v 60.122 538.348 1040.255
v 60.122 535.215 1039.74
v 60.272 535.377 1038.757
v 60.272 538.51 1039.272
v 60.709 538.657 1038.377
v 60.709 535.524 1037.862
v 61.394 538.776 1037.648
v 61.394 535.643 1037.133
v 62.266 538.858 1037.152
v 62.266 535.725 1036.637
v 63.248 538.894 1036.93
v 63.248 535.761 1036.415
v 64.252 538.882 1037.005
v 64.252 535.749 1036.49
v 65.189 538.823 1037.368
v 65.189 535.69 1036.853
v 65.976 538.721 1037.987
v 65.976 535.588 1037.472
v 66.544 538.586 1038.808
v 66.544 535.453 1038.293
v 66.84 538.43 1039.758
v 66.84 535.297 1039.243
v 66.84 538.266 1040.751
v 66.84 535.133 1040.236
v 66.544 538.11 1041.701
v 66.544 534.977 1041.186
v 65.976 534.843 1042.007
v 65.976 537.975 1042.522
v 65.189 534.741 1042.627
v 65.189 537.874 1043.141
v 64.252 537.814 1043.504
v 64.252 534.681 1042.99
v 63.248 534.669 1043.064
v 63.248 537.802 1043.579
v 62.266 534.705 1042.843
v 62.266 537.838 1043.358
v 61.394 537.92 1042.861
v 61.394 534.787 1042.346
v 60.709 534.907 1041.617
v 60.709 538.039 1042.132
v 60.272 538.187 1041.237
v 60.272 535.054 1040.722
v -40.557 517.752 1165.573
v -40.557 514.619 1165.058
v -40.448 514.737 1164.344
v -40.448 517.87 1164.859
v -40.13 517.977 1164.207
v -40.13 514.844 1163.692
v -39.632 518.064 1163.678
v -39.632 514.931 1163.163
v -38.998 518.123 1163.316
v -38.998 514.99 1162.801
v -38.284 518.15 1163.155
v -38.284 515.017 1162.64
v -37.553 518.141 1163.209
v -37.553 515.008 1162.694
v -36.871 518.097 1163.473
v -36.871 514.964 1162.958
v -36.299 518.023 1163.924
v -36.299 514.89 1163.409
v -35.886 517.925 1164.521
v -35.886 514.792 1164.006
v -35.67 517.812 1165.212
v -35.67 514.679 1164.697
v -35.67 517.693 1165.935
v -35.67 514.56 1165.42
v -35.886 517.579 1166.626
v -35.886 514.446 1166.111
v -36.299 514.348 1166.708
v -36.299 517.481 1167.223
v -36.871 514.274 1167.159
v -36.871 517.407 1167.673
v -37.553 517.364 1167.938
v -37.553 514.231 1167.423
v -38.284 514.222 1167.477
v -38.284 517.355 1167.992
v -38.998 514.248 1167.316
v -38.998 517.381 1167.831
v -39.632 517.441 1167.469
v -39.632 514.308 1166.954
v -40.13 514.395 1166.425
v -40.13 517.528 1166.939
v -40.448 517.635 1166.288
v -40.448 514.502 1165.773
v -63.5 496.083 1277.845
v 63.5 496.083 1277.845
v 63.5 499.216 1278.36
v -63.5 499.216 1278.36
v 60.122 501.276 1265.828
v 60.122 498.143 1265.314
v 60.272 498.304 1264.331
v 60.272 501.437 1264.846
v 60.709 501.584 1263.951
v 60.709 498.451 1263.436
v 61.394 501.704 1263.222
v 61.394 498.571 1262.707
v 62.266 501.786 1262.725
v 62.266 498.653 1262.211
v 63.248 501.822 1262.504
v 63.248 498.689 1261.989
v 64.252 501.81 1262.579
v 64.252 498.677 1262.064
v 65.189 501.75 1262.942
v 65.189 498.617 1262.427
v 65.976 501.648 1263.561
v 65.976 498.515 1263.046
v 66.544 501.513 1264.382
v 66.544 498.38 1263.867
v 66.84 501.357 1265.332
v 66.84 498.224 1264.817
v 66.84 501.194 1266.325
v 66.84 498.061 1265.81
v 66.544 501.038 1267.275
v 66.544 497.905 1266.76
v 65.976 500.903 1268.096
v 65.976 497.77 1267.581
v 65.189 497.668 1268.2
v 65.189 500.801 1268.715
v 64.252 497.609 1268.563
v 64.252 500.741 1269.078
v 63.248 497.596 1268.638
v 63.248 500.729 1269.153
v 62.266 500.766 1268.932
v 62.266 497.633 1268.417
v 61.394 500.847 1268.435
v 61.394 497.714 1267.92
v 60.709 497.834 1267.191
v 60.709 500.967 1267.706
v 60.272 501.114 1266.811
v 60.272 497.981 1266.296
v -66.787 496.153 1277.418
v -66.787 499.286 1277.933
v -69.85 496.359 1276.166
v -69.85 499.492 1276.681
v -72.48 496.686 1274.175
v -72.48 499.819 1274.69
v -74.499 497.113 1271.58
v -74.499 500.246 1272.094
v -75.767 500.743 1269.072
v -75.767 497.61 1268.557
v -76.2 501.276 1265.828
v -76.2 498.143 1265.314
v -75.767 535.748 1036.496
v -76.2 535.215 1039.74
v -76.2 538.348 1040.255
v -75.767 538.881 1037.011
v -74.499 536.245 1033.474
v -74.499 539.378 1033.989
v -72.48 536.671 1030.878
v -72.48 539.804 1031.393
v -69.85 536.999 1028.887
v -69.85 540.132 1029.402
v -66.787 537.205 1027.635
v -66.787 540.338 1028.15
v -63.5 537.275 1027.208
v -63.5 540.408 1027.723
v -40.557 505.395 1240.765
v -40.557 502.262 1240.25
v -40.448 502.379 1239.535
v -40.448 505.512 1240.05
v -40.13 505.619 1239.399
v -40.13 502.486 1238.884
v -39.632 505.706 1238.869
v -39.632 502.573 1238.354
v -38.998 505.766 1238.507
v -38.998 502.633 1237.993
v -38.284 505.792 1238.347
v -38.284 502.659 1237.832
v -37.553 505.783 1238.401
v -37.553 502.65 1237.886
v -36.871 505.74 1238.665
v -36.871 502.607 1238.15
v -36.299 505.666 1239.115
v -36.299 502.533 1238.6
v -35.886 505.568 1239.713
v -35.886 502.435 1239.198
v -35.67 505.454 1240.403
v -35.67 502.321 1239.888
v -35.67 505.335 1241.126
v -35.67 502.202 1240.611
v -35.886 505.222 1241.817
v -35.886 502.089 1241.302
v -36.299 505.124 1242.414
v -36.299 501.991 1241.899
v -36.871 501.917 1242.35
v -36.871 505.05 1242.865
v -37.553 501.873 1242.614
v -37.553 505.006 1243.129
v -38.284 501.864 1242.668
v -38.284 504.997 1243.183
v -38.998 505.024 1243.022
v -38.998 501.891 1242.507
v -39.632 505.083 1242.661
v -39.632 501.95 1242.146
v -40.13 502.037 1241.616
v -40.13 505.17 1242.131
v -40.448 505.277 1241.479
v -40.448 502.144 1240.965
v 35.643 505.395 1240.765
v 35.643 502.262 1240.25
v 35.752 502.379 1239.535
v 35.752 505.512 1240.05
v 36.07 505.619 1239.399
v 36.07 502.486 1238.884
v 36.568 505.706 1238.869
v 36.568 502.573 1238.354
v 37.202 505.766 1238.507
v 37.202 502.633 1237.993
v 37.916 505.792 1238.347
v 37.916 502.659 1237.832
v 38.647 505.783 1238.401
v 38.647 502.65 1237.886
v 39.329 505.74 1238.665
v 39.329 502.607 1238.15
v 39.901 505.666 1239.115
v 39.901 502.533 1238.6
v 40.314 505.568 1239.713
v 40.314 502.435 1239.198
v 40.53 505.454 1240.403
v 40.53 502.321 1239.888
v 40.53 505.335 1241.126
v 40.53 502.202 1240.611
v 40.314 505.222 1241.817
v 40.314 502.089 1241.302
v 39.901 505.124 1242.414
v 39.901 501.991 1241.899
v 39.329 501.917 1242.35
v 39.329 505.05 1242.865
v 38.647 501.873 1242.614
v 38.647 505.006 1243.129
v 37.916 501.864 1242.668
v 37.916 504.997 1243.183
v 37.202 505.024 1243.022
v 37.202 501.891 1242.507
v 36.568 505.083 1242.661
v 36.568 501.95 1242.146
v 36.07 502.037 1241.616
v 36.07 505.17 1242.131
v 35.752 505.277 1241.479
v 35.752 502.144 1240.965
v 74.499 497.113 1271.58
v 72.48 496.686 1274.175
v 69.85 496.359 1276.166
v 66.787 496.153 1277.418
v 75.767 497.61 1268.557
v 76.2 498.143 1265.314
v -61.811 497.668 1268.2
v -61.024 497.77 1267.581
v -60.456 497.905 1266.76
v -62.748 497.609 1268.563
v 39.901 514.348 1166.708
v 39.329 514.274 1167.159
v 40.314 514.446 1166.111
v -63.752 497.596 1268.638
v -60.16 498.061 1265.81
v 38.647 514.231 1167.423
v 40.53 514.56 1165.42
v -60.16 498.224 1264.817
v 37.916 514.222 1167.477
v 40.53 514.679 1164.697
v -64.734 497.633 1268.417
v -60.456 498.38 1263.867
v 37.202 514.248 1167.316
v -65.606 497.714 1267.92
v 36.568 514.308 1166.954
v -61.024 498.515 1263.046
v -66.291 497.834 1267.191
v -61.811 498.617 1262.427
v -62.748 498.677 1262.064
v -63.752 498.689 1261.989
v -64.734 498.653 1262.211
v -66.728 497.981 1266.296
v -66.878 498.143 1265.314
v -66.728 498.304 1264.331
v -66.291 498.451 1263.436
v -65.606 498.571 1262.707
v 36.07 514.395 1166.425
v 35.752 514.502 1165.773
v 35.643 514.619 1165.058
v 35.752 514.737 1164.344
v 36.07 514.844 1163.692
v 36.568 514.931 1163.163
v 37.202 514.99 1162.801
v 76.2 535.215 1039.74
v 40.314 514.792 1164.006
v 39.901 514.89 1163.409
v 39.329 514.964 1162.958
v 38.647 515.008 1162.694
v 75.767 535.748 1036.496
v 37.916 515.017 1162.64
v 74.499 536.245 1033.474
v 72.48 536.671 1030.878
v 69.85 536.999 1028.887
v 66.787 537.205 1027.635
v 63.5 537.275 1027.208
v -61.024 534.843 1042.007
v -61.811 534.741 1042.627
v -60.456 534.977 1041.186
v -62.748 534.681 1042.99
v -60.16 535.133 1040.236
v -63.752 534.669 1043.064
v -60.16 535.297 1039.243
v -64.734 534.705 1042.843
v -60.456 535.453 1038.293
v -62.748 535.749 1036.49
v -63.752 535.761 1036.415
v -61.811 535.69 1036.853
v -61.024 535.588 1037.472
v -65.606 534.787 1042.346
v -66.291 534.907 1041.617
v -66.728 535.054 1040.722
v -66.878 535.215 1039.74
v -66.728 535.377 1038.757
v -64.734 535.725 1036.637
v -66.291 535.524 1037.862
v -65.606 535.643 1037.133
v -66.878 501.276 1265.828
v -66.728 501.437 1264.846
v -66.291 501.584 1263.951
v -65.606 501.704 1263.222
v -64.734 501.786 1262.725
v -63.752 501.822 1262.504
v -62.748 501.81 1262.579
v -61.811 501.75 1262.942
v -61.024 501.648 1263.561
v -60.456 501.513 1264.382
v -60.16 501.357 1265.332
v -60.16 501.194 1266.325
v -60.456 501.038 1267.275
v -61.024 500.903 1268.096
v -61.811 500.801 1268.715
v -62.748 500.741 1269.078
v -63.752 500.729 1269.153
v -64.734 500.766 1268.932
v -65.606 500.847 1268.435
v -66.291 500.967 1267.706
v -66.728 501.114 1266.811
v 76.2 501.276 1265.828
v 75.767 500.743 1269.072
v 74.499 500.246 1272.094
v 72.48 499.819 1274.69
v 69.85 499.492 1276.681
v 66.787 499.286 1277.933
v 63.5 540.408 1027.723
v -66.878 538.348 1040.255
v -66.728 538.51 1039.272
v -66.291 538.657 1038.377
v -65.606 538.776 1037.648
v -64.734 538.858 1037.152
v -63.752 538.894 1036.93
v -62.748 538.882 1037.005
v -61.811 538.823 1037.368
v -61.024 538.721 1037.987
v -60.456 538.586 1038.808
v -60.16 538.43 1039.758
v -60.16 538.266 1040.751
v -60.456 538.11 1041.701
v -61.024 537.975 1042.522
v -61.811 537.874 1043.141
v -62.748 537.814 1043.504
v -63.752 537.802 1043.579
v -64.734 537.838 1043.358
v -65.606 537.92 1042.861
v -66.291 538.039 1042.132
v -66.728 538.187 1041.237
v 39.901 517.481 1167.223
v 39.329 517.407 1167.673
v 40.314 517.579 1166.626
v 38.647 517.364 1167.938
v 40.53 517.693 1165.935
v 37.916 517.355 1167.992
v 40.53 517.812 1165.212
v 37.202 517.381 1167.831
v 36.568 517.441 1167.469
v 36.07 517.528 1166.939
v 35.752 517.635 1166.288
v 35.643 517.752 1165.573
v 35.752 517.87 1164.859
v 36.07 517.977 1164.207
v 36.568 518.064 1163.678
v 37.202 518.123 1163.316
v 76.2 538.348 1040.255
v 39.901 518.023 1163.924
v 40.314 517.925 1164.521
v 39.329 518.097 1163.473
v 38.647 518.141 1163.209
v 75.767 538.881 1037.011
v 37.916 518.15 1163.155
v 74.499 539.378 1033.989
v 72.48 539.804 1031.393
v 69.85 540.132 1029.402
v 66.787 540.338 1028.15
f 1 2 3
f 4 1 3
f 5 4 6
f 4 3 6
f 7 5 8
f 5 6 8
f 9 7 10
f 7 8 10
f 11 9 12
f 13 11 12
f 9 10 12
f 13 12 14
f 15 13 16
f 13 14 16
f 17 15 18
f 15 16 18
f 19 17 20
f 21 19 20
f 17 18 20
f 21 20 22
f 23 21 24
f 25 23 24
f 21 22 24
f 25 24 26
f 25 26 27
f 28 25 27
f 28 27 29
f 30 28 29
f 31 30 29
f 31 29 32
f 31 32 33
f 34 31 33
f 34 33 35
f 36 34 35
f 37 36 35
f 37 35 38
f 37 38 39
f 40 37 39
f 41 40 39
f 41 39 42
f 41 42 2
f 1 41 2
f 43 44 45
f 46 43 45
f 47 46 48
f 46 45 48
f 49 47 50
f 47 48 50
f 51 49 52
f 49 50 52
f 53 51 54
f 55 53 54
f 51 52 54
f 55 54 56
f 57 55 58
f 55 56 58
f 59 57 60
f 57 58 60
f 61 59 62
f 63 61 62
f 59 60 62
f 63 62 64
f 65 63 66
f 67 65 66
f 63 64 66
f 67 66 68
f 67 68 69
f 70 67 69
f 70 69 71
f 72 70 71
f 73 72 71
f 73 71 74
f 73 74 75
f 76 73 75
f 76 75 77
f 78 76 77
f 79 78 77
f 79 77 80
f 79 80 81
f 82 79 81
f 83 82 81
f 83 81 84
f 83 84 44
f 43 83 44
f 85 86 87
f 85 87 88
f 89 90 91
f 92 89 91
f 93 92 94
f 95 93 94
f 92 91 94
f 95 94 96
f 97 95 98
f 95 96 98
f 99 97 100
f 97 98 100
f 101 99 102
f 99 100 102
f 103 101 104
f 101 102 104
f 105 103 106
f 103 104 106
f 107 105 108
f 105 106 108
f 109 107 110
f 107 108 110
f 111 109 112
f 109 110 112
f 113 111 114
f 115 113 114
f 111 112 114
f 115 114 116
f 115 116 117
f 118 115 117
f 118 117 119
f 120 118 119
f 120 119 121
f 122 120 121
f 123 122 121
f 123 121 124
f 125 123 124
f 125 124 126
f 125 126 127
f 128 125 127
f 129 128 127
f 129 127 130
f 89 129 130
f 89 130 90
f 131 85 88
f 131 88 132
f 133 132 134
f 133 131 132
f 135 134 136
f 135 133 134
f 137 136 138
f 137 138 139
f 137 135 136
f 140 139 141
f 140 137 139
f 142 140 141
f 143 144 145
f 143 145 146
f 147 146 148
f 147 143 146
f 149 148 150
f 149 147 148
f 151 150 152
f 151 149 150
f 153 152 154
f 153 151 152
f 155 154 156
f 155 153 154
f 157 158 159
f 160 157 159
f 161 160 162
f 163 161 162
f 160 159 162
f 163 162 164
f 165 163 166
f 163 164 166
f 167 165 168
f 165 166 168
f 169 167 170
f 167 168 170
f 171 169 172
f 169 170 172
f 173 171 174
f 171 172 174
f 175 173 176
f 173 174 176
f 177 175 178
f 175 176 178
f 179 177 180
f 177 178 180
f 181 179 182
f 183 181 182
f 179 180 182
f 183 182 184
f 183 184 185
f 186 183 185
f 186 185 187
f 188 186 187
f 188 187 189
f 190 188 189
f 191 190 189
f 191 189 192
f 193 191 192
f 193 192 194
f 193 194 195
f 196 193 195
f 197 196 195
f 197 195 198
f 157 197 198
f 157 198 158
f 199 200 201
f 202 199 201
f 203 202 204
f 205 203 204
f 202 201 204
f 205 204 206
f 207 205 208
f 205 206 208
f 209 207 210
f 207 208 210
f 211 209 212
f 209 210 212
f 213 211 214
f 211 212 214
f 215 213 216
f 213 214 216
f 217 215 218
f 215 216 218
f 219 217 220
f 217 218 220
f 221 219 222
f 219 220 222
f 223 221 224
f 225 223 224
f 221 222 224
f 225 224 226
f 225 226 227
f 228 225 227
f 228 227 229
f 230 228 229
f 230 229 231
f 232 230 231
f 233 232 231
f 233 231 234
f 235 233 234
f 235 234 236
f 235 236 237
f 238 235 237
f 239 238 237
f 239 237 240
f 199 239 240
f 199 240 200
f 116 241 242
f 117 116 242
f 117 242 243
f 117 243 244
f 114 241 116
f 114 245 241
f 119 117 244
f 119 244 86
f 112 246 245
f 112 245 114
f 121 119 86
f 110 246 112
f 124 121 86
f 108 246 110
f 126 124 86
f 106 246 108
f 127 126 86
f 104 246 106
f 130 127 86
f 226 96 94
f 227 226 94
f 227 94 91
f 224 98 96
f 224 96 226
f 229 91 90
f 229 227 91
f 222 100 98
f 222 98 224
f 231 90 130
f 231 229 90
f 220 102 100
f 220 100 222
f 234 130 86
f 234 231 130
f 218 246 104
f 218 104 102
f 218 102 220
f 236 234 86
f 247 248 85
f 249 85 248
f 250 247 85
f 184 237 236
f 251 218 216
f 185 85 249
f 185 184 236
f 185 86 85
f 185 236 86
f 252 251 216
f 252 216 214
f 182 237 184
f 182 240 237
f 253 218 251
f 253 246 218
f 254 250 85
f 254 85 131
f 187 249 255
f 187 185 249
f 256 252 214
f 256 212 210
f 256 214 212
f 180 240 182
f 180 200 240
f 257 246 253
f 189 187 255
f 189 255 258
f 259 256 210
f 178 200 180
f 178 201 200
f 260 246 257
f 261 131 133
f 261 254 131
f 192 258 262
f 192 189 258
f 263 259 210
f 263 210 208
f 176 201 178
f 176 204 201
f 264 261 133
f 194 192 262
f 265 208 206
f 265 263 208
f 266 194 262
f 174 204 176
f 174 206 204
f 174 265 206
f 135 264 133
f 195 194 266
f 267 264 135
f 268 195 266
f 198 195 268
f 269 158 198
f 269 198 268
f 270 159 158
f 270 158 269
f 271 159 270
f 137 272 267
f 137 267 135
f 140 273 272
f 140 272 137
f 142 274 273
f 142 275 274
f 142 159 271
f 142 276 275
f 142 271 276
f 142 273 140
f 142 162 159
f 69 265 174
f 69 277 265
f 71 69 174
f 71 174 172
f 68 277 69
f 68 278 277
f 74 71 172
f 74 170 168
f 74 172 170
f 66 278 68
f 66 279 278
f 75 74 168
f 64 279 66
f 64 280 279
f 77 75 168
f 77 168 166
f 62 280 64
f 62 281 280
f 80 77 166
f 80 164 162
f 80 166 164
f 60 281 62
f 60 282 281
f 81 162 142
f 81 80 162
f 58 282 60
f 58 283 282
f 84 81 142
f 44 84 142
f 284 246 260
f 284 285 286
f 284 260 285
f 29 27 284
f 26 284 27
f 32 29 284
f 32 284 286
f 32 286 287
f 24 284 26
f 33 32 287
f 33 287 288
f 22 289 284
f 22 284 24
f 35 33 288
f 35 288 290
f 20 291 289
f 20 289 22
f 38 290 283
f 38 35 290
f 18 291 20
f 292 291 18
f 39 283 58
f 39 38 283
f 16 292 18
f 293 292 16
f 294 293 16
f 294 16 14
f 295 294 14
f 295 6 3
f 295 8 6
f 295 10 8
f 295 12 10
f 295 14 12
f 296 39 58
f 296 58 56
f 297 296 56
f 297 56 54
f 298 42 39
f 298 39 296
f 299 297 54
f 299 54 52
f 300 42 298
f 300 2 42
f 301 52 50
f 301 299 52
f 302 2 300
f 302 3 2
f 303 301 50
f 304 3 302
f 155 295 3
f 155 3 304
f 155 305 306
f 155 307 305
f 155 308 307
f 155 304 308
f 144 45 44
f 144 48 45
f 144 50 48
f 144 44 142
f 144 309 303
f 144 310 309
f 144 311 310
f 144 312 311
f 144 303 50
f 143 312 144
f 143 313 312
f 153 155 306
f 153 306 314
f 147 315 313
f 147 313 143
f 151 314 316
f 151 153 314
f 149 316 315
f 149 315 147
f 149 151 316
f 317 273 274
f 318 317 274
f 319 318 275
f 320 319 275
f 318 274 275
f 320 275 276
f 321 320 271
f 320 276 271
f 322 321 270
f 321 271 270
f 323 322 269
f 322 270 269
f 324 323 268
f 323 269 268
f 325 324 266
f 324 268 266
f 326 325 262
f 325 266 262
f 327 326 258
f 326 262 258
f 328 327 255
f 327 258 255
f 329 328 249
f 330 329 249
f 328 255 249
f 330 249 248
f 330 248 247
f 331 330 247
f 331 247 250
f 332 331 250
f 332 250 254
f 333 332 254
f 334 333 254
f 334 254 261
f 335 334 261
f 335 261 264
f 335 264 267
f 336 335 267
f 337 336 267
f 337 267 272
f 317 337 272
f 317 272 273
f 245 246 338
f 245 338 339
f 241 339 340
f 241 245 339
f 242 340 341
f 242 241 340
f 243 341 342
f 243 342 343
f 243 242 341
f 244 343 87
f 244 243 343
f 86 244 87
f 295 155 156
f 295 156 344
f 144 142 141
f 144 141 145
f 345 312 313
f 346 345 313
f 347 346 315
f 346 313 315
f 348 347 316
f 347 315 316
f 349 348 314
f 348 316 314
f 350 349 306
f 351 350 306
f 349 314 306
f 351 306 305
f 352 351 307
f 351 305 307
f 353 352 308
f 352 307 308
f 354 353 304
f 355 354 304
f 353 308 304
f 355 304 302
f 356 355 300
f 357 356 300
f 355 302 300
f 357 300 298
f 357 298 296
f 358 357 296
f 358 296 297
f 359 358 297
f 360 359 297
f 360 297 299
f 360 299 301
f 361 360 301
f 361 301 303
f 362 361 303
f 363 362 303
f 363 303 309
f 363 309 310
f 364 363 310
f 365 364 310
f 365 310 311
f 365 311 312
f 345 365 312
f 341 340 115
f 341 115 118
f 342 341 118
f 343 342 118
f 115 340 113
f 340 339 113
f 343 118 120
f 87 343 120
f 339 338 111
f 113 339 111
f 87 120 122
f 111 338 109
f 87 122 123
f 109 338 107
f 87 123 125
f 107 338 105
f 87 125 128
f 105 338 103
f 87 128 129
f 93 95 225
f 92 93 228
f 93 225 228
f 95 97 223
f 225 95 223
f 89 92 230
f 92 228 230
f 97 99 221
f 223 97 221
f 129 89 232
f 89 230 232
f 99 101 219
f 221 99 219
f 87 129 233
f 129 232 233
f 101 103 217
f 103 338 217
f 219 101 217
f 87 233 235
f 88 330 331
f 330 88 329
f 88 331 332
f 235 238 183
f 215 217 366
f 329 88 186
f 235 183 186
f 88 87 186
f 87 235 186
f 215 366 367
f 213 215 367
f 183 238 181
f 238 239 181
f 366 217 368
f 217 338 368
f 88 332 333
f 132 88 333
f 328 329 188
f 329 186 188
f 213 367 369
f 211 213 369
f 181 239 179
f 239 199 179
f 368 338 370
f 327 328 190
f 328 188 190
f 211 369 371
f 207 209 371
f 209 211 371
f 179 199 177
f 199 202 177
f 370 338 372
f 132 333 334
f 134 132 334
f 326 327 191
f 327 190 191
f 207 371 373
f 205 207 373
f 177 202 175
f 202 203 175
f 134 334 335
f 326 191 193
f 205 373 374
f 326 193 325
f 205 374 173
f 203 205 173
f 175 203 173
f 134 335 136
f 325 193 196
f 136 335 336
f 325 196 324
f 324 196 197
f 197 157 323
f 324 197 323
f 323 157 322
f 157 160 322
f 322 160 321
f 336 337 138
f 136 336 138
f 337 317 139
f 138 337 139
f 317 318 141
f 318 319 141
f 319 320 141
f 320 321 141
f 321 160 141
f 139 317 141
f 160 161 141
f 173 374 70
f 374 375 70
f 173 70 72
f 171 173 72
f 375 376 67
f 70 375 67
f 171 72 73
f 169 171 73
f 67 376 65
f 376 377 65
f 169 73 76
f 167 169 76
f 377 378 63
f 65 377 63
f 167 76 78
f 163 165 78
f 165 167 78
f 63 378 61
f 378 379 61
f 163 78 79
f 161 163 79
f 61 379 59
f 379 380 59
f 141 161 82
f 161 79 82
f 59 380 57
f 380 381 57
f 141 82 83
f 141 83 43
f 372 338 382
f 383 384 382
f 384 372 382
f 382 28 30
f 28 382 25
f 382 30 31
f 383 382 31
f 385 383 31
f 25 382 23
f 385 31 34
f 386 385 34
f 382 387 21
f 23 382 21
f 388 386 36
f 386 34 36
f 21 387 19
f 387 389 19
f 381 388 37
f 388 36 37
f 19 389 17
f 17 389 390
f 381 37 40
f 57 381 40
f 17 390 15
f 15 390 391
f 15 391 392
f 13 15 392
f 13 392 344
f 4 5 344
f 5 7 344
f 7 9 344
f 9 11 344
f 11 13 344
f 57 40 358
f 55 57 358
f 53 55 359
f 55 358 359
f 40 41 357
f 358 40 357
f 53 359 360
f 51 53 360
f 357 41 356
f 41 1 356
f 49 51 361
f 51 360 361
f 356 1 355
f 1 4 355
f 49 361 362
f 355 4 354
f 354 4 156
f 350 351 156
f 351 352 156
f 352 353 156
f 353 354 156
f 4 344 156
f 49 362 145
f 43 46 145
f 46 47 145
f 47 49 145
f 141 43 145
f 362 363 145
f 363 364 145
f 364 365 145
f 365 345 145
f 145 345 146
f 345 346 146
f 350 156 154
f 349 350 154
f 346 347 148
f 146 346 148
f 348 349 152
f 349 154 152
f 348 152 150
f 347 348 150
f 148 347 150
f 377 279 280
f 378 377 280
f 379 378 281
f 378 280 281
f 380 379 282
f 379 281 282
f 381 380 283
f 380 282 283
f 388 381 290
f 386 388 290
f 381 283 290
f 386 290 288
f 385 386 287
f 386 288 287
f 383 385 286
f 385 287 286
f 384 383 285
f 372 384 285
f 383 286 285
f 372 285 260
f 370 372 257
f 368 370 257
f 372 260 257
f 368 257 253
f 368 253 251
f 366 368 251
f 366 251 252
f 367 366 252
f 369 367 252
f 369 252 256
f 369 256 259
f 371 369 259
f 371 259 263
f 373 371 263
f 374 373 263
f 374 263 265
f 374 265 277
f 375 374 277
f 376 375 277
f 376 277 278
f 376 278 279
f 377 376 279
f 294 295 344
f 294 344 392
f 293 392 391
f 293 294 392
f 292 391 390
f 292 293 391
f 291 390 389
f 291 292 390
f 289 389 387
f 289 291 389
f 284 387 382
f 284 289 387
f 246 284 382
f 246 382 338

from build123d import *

# Parameters (mm, degrees)
BOSS_EXTRUDE1_DEPTH          = 3.175
F_1_4_CLEARANCE_HOLE1_D      = 6.7564
F_10_0_1935_DIAMETER_HOLE1_D = 4.9149


with BuildPart() as part:
    # Sketch1 → Boss-Extrude1 (new body)
    with BuildSketch(Plane(origin=(0, 687.523670024, 112.992800714), x_dir=(1, 0, 0), z_dir=(0, 0.9867625124381891, 0.16217195826243377))):
        with BuildLine():
            Line((-76.2, -1167.779230682), (-76.2, -939.179230682))
            ThreePointArc((-76.2, -939.179230682), (-72.480256121, -930.198974561), (-63.5, -926.479230682))
            Line((-63.5, -926.479230682), (63.5, -926.479230682))
            ThreePointArc((63.5, -926.479230682), (72.480256121, -930.198974561), (76.2, -939.179230682))
            Line((76.2, -939.179230682), (76.2, -1167.779230682))
            ThreePointArc((76.2, -1167.779230682), (72.480256121, -1176.759486803), (63.5, -1180.479230682))
            Line((63.5, -1180.479230682), (-63.5, -1180.479230682))
            ThreePointArc((-63.5, -1180.479230682), (-72.480256121, -1176.759486803), (-76.2, -1167.779230682))
        make_face()
    extrude(amount=BOSS_EXTRUDE1_DEPTH)

    # 1/4 Clearance Hole1 (through all)
    with Locations(Plane(origin=(0, 690.656641001, 113.507696681), x_dir=(1, 0, 0), z_dir=(0, 0.9867625124381894, 0.16217195826243377))):
        with Locations((-63.5, -1167.779230682), (63.5, -1167.779230682), (63.5, -939.179230682), (-63.5, -939.179230682)):
            Hole(F_1_4_CLEARANCE_HOLE1_D / 2)

    # #10 (0.1935) Diameter Hole1 (through all)
    with Locations(Plane(origin=(0, 690.656641001, 113.507696681), x_dir=(1, 0, 0), z_dir=(0, 0.9867625124381891, 0.1621719582624338))):
        with Locations((38.1, -1142.379230682), (-38.1, -1142.379230682), (38.1, -1066.179230682), (-38.1, -1066.179230682)):
            Hole(F_10_0_1935_DIAMETER_HOLE1_D / 2)


solid = part.part
